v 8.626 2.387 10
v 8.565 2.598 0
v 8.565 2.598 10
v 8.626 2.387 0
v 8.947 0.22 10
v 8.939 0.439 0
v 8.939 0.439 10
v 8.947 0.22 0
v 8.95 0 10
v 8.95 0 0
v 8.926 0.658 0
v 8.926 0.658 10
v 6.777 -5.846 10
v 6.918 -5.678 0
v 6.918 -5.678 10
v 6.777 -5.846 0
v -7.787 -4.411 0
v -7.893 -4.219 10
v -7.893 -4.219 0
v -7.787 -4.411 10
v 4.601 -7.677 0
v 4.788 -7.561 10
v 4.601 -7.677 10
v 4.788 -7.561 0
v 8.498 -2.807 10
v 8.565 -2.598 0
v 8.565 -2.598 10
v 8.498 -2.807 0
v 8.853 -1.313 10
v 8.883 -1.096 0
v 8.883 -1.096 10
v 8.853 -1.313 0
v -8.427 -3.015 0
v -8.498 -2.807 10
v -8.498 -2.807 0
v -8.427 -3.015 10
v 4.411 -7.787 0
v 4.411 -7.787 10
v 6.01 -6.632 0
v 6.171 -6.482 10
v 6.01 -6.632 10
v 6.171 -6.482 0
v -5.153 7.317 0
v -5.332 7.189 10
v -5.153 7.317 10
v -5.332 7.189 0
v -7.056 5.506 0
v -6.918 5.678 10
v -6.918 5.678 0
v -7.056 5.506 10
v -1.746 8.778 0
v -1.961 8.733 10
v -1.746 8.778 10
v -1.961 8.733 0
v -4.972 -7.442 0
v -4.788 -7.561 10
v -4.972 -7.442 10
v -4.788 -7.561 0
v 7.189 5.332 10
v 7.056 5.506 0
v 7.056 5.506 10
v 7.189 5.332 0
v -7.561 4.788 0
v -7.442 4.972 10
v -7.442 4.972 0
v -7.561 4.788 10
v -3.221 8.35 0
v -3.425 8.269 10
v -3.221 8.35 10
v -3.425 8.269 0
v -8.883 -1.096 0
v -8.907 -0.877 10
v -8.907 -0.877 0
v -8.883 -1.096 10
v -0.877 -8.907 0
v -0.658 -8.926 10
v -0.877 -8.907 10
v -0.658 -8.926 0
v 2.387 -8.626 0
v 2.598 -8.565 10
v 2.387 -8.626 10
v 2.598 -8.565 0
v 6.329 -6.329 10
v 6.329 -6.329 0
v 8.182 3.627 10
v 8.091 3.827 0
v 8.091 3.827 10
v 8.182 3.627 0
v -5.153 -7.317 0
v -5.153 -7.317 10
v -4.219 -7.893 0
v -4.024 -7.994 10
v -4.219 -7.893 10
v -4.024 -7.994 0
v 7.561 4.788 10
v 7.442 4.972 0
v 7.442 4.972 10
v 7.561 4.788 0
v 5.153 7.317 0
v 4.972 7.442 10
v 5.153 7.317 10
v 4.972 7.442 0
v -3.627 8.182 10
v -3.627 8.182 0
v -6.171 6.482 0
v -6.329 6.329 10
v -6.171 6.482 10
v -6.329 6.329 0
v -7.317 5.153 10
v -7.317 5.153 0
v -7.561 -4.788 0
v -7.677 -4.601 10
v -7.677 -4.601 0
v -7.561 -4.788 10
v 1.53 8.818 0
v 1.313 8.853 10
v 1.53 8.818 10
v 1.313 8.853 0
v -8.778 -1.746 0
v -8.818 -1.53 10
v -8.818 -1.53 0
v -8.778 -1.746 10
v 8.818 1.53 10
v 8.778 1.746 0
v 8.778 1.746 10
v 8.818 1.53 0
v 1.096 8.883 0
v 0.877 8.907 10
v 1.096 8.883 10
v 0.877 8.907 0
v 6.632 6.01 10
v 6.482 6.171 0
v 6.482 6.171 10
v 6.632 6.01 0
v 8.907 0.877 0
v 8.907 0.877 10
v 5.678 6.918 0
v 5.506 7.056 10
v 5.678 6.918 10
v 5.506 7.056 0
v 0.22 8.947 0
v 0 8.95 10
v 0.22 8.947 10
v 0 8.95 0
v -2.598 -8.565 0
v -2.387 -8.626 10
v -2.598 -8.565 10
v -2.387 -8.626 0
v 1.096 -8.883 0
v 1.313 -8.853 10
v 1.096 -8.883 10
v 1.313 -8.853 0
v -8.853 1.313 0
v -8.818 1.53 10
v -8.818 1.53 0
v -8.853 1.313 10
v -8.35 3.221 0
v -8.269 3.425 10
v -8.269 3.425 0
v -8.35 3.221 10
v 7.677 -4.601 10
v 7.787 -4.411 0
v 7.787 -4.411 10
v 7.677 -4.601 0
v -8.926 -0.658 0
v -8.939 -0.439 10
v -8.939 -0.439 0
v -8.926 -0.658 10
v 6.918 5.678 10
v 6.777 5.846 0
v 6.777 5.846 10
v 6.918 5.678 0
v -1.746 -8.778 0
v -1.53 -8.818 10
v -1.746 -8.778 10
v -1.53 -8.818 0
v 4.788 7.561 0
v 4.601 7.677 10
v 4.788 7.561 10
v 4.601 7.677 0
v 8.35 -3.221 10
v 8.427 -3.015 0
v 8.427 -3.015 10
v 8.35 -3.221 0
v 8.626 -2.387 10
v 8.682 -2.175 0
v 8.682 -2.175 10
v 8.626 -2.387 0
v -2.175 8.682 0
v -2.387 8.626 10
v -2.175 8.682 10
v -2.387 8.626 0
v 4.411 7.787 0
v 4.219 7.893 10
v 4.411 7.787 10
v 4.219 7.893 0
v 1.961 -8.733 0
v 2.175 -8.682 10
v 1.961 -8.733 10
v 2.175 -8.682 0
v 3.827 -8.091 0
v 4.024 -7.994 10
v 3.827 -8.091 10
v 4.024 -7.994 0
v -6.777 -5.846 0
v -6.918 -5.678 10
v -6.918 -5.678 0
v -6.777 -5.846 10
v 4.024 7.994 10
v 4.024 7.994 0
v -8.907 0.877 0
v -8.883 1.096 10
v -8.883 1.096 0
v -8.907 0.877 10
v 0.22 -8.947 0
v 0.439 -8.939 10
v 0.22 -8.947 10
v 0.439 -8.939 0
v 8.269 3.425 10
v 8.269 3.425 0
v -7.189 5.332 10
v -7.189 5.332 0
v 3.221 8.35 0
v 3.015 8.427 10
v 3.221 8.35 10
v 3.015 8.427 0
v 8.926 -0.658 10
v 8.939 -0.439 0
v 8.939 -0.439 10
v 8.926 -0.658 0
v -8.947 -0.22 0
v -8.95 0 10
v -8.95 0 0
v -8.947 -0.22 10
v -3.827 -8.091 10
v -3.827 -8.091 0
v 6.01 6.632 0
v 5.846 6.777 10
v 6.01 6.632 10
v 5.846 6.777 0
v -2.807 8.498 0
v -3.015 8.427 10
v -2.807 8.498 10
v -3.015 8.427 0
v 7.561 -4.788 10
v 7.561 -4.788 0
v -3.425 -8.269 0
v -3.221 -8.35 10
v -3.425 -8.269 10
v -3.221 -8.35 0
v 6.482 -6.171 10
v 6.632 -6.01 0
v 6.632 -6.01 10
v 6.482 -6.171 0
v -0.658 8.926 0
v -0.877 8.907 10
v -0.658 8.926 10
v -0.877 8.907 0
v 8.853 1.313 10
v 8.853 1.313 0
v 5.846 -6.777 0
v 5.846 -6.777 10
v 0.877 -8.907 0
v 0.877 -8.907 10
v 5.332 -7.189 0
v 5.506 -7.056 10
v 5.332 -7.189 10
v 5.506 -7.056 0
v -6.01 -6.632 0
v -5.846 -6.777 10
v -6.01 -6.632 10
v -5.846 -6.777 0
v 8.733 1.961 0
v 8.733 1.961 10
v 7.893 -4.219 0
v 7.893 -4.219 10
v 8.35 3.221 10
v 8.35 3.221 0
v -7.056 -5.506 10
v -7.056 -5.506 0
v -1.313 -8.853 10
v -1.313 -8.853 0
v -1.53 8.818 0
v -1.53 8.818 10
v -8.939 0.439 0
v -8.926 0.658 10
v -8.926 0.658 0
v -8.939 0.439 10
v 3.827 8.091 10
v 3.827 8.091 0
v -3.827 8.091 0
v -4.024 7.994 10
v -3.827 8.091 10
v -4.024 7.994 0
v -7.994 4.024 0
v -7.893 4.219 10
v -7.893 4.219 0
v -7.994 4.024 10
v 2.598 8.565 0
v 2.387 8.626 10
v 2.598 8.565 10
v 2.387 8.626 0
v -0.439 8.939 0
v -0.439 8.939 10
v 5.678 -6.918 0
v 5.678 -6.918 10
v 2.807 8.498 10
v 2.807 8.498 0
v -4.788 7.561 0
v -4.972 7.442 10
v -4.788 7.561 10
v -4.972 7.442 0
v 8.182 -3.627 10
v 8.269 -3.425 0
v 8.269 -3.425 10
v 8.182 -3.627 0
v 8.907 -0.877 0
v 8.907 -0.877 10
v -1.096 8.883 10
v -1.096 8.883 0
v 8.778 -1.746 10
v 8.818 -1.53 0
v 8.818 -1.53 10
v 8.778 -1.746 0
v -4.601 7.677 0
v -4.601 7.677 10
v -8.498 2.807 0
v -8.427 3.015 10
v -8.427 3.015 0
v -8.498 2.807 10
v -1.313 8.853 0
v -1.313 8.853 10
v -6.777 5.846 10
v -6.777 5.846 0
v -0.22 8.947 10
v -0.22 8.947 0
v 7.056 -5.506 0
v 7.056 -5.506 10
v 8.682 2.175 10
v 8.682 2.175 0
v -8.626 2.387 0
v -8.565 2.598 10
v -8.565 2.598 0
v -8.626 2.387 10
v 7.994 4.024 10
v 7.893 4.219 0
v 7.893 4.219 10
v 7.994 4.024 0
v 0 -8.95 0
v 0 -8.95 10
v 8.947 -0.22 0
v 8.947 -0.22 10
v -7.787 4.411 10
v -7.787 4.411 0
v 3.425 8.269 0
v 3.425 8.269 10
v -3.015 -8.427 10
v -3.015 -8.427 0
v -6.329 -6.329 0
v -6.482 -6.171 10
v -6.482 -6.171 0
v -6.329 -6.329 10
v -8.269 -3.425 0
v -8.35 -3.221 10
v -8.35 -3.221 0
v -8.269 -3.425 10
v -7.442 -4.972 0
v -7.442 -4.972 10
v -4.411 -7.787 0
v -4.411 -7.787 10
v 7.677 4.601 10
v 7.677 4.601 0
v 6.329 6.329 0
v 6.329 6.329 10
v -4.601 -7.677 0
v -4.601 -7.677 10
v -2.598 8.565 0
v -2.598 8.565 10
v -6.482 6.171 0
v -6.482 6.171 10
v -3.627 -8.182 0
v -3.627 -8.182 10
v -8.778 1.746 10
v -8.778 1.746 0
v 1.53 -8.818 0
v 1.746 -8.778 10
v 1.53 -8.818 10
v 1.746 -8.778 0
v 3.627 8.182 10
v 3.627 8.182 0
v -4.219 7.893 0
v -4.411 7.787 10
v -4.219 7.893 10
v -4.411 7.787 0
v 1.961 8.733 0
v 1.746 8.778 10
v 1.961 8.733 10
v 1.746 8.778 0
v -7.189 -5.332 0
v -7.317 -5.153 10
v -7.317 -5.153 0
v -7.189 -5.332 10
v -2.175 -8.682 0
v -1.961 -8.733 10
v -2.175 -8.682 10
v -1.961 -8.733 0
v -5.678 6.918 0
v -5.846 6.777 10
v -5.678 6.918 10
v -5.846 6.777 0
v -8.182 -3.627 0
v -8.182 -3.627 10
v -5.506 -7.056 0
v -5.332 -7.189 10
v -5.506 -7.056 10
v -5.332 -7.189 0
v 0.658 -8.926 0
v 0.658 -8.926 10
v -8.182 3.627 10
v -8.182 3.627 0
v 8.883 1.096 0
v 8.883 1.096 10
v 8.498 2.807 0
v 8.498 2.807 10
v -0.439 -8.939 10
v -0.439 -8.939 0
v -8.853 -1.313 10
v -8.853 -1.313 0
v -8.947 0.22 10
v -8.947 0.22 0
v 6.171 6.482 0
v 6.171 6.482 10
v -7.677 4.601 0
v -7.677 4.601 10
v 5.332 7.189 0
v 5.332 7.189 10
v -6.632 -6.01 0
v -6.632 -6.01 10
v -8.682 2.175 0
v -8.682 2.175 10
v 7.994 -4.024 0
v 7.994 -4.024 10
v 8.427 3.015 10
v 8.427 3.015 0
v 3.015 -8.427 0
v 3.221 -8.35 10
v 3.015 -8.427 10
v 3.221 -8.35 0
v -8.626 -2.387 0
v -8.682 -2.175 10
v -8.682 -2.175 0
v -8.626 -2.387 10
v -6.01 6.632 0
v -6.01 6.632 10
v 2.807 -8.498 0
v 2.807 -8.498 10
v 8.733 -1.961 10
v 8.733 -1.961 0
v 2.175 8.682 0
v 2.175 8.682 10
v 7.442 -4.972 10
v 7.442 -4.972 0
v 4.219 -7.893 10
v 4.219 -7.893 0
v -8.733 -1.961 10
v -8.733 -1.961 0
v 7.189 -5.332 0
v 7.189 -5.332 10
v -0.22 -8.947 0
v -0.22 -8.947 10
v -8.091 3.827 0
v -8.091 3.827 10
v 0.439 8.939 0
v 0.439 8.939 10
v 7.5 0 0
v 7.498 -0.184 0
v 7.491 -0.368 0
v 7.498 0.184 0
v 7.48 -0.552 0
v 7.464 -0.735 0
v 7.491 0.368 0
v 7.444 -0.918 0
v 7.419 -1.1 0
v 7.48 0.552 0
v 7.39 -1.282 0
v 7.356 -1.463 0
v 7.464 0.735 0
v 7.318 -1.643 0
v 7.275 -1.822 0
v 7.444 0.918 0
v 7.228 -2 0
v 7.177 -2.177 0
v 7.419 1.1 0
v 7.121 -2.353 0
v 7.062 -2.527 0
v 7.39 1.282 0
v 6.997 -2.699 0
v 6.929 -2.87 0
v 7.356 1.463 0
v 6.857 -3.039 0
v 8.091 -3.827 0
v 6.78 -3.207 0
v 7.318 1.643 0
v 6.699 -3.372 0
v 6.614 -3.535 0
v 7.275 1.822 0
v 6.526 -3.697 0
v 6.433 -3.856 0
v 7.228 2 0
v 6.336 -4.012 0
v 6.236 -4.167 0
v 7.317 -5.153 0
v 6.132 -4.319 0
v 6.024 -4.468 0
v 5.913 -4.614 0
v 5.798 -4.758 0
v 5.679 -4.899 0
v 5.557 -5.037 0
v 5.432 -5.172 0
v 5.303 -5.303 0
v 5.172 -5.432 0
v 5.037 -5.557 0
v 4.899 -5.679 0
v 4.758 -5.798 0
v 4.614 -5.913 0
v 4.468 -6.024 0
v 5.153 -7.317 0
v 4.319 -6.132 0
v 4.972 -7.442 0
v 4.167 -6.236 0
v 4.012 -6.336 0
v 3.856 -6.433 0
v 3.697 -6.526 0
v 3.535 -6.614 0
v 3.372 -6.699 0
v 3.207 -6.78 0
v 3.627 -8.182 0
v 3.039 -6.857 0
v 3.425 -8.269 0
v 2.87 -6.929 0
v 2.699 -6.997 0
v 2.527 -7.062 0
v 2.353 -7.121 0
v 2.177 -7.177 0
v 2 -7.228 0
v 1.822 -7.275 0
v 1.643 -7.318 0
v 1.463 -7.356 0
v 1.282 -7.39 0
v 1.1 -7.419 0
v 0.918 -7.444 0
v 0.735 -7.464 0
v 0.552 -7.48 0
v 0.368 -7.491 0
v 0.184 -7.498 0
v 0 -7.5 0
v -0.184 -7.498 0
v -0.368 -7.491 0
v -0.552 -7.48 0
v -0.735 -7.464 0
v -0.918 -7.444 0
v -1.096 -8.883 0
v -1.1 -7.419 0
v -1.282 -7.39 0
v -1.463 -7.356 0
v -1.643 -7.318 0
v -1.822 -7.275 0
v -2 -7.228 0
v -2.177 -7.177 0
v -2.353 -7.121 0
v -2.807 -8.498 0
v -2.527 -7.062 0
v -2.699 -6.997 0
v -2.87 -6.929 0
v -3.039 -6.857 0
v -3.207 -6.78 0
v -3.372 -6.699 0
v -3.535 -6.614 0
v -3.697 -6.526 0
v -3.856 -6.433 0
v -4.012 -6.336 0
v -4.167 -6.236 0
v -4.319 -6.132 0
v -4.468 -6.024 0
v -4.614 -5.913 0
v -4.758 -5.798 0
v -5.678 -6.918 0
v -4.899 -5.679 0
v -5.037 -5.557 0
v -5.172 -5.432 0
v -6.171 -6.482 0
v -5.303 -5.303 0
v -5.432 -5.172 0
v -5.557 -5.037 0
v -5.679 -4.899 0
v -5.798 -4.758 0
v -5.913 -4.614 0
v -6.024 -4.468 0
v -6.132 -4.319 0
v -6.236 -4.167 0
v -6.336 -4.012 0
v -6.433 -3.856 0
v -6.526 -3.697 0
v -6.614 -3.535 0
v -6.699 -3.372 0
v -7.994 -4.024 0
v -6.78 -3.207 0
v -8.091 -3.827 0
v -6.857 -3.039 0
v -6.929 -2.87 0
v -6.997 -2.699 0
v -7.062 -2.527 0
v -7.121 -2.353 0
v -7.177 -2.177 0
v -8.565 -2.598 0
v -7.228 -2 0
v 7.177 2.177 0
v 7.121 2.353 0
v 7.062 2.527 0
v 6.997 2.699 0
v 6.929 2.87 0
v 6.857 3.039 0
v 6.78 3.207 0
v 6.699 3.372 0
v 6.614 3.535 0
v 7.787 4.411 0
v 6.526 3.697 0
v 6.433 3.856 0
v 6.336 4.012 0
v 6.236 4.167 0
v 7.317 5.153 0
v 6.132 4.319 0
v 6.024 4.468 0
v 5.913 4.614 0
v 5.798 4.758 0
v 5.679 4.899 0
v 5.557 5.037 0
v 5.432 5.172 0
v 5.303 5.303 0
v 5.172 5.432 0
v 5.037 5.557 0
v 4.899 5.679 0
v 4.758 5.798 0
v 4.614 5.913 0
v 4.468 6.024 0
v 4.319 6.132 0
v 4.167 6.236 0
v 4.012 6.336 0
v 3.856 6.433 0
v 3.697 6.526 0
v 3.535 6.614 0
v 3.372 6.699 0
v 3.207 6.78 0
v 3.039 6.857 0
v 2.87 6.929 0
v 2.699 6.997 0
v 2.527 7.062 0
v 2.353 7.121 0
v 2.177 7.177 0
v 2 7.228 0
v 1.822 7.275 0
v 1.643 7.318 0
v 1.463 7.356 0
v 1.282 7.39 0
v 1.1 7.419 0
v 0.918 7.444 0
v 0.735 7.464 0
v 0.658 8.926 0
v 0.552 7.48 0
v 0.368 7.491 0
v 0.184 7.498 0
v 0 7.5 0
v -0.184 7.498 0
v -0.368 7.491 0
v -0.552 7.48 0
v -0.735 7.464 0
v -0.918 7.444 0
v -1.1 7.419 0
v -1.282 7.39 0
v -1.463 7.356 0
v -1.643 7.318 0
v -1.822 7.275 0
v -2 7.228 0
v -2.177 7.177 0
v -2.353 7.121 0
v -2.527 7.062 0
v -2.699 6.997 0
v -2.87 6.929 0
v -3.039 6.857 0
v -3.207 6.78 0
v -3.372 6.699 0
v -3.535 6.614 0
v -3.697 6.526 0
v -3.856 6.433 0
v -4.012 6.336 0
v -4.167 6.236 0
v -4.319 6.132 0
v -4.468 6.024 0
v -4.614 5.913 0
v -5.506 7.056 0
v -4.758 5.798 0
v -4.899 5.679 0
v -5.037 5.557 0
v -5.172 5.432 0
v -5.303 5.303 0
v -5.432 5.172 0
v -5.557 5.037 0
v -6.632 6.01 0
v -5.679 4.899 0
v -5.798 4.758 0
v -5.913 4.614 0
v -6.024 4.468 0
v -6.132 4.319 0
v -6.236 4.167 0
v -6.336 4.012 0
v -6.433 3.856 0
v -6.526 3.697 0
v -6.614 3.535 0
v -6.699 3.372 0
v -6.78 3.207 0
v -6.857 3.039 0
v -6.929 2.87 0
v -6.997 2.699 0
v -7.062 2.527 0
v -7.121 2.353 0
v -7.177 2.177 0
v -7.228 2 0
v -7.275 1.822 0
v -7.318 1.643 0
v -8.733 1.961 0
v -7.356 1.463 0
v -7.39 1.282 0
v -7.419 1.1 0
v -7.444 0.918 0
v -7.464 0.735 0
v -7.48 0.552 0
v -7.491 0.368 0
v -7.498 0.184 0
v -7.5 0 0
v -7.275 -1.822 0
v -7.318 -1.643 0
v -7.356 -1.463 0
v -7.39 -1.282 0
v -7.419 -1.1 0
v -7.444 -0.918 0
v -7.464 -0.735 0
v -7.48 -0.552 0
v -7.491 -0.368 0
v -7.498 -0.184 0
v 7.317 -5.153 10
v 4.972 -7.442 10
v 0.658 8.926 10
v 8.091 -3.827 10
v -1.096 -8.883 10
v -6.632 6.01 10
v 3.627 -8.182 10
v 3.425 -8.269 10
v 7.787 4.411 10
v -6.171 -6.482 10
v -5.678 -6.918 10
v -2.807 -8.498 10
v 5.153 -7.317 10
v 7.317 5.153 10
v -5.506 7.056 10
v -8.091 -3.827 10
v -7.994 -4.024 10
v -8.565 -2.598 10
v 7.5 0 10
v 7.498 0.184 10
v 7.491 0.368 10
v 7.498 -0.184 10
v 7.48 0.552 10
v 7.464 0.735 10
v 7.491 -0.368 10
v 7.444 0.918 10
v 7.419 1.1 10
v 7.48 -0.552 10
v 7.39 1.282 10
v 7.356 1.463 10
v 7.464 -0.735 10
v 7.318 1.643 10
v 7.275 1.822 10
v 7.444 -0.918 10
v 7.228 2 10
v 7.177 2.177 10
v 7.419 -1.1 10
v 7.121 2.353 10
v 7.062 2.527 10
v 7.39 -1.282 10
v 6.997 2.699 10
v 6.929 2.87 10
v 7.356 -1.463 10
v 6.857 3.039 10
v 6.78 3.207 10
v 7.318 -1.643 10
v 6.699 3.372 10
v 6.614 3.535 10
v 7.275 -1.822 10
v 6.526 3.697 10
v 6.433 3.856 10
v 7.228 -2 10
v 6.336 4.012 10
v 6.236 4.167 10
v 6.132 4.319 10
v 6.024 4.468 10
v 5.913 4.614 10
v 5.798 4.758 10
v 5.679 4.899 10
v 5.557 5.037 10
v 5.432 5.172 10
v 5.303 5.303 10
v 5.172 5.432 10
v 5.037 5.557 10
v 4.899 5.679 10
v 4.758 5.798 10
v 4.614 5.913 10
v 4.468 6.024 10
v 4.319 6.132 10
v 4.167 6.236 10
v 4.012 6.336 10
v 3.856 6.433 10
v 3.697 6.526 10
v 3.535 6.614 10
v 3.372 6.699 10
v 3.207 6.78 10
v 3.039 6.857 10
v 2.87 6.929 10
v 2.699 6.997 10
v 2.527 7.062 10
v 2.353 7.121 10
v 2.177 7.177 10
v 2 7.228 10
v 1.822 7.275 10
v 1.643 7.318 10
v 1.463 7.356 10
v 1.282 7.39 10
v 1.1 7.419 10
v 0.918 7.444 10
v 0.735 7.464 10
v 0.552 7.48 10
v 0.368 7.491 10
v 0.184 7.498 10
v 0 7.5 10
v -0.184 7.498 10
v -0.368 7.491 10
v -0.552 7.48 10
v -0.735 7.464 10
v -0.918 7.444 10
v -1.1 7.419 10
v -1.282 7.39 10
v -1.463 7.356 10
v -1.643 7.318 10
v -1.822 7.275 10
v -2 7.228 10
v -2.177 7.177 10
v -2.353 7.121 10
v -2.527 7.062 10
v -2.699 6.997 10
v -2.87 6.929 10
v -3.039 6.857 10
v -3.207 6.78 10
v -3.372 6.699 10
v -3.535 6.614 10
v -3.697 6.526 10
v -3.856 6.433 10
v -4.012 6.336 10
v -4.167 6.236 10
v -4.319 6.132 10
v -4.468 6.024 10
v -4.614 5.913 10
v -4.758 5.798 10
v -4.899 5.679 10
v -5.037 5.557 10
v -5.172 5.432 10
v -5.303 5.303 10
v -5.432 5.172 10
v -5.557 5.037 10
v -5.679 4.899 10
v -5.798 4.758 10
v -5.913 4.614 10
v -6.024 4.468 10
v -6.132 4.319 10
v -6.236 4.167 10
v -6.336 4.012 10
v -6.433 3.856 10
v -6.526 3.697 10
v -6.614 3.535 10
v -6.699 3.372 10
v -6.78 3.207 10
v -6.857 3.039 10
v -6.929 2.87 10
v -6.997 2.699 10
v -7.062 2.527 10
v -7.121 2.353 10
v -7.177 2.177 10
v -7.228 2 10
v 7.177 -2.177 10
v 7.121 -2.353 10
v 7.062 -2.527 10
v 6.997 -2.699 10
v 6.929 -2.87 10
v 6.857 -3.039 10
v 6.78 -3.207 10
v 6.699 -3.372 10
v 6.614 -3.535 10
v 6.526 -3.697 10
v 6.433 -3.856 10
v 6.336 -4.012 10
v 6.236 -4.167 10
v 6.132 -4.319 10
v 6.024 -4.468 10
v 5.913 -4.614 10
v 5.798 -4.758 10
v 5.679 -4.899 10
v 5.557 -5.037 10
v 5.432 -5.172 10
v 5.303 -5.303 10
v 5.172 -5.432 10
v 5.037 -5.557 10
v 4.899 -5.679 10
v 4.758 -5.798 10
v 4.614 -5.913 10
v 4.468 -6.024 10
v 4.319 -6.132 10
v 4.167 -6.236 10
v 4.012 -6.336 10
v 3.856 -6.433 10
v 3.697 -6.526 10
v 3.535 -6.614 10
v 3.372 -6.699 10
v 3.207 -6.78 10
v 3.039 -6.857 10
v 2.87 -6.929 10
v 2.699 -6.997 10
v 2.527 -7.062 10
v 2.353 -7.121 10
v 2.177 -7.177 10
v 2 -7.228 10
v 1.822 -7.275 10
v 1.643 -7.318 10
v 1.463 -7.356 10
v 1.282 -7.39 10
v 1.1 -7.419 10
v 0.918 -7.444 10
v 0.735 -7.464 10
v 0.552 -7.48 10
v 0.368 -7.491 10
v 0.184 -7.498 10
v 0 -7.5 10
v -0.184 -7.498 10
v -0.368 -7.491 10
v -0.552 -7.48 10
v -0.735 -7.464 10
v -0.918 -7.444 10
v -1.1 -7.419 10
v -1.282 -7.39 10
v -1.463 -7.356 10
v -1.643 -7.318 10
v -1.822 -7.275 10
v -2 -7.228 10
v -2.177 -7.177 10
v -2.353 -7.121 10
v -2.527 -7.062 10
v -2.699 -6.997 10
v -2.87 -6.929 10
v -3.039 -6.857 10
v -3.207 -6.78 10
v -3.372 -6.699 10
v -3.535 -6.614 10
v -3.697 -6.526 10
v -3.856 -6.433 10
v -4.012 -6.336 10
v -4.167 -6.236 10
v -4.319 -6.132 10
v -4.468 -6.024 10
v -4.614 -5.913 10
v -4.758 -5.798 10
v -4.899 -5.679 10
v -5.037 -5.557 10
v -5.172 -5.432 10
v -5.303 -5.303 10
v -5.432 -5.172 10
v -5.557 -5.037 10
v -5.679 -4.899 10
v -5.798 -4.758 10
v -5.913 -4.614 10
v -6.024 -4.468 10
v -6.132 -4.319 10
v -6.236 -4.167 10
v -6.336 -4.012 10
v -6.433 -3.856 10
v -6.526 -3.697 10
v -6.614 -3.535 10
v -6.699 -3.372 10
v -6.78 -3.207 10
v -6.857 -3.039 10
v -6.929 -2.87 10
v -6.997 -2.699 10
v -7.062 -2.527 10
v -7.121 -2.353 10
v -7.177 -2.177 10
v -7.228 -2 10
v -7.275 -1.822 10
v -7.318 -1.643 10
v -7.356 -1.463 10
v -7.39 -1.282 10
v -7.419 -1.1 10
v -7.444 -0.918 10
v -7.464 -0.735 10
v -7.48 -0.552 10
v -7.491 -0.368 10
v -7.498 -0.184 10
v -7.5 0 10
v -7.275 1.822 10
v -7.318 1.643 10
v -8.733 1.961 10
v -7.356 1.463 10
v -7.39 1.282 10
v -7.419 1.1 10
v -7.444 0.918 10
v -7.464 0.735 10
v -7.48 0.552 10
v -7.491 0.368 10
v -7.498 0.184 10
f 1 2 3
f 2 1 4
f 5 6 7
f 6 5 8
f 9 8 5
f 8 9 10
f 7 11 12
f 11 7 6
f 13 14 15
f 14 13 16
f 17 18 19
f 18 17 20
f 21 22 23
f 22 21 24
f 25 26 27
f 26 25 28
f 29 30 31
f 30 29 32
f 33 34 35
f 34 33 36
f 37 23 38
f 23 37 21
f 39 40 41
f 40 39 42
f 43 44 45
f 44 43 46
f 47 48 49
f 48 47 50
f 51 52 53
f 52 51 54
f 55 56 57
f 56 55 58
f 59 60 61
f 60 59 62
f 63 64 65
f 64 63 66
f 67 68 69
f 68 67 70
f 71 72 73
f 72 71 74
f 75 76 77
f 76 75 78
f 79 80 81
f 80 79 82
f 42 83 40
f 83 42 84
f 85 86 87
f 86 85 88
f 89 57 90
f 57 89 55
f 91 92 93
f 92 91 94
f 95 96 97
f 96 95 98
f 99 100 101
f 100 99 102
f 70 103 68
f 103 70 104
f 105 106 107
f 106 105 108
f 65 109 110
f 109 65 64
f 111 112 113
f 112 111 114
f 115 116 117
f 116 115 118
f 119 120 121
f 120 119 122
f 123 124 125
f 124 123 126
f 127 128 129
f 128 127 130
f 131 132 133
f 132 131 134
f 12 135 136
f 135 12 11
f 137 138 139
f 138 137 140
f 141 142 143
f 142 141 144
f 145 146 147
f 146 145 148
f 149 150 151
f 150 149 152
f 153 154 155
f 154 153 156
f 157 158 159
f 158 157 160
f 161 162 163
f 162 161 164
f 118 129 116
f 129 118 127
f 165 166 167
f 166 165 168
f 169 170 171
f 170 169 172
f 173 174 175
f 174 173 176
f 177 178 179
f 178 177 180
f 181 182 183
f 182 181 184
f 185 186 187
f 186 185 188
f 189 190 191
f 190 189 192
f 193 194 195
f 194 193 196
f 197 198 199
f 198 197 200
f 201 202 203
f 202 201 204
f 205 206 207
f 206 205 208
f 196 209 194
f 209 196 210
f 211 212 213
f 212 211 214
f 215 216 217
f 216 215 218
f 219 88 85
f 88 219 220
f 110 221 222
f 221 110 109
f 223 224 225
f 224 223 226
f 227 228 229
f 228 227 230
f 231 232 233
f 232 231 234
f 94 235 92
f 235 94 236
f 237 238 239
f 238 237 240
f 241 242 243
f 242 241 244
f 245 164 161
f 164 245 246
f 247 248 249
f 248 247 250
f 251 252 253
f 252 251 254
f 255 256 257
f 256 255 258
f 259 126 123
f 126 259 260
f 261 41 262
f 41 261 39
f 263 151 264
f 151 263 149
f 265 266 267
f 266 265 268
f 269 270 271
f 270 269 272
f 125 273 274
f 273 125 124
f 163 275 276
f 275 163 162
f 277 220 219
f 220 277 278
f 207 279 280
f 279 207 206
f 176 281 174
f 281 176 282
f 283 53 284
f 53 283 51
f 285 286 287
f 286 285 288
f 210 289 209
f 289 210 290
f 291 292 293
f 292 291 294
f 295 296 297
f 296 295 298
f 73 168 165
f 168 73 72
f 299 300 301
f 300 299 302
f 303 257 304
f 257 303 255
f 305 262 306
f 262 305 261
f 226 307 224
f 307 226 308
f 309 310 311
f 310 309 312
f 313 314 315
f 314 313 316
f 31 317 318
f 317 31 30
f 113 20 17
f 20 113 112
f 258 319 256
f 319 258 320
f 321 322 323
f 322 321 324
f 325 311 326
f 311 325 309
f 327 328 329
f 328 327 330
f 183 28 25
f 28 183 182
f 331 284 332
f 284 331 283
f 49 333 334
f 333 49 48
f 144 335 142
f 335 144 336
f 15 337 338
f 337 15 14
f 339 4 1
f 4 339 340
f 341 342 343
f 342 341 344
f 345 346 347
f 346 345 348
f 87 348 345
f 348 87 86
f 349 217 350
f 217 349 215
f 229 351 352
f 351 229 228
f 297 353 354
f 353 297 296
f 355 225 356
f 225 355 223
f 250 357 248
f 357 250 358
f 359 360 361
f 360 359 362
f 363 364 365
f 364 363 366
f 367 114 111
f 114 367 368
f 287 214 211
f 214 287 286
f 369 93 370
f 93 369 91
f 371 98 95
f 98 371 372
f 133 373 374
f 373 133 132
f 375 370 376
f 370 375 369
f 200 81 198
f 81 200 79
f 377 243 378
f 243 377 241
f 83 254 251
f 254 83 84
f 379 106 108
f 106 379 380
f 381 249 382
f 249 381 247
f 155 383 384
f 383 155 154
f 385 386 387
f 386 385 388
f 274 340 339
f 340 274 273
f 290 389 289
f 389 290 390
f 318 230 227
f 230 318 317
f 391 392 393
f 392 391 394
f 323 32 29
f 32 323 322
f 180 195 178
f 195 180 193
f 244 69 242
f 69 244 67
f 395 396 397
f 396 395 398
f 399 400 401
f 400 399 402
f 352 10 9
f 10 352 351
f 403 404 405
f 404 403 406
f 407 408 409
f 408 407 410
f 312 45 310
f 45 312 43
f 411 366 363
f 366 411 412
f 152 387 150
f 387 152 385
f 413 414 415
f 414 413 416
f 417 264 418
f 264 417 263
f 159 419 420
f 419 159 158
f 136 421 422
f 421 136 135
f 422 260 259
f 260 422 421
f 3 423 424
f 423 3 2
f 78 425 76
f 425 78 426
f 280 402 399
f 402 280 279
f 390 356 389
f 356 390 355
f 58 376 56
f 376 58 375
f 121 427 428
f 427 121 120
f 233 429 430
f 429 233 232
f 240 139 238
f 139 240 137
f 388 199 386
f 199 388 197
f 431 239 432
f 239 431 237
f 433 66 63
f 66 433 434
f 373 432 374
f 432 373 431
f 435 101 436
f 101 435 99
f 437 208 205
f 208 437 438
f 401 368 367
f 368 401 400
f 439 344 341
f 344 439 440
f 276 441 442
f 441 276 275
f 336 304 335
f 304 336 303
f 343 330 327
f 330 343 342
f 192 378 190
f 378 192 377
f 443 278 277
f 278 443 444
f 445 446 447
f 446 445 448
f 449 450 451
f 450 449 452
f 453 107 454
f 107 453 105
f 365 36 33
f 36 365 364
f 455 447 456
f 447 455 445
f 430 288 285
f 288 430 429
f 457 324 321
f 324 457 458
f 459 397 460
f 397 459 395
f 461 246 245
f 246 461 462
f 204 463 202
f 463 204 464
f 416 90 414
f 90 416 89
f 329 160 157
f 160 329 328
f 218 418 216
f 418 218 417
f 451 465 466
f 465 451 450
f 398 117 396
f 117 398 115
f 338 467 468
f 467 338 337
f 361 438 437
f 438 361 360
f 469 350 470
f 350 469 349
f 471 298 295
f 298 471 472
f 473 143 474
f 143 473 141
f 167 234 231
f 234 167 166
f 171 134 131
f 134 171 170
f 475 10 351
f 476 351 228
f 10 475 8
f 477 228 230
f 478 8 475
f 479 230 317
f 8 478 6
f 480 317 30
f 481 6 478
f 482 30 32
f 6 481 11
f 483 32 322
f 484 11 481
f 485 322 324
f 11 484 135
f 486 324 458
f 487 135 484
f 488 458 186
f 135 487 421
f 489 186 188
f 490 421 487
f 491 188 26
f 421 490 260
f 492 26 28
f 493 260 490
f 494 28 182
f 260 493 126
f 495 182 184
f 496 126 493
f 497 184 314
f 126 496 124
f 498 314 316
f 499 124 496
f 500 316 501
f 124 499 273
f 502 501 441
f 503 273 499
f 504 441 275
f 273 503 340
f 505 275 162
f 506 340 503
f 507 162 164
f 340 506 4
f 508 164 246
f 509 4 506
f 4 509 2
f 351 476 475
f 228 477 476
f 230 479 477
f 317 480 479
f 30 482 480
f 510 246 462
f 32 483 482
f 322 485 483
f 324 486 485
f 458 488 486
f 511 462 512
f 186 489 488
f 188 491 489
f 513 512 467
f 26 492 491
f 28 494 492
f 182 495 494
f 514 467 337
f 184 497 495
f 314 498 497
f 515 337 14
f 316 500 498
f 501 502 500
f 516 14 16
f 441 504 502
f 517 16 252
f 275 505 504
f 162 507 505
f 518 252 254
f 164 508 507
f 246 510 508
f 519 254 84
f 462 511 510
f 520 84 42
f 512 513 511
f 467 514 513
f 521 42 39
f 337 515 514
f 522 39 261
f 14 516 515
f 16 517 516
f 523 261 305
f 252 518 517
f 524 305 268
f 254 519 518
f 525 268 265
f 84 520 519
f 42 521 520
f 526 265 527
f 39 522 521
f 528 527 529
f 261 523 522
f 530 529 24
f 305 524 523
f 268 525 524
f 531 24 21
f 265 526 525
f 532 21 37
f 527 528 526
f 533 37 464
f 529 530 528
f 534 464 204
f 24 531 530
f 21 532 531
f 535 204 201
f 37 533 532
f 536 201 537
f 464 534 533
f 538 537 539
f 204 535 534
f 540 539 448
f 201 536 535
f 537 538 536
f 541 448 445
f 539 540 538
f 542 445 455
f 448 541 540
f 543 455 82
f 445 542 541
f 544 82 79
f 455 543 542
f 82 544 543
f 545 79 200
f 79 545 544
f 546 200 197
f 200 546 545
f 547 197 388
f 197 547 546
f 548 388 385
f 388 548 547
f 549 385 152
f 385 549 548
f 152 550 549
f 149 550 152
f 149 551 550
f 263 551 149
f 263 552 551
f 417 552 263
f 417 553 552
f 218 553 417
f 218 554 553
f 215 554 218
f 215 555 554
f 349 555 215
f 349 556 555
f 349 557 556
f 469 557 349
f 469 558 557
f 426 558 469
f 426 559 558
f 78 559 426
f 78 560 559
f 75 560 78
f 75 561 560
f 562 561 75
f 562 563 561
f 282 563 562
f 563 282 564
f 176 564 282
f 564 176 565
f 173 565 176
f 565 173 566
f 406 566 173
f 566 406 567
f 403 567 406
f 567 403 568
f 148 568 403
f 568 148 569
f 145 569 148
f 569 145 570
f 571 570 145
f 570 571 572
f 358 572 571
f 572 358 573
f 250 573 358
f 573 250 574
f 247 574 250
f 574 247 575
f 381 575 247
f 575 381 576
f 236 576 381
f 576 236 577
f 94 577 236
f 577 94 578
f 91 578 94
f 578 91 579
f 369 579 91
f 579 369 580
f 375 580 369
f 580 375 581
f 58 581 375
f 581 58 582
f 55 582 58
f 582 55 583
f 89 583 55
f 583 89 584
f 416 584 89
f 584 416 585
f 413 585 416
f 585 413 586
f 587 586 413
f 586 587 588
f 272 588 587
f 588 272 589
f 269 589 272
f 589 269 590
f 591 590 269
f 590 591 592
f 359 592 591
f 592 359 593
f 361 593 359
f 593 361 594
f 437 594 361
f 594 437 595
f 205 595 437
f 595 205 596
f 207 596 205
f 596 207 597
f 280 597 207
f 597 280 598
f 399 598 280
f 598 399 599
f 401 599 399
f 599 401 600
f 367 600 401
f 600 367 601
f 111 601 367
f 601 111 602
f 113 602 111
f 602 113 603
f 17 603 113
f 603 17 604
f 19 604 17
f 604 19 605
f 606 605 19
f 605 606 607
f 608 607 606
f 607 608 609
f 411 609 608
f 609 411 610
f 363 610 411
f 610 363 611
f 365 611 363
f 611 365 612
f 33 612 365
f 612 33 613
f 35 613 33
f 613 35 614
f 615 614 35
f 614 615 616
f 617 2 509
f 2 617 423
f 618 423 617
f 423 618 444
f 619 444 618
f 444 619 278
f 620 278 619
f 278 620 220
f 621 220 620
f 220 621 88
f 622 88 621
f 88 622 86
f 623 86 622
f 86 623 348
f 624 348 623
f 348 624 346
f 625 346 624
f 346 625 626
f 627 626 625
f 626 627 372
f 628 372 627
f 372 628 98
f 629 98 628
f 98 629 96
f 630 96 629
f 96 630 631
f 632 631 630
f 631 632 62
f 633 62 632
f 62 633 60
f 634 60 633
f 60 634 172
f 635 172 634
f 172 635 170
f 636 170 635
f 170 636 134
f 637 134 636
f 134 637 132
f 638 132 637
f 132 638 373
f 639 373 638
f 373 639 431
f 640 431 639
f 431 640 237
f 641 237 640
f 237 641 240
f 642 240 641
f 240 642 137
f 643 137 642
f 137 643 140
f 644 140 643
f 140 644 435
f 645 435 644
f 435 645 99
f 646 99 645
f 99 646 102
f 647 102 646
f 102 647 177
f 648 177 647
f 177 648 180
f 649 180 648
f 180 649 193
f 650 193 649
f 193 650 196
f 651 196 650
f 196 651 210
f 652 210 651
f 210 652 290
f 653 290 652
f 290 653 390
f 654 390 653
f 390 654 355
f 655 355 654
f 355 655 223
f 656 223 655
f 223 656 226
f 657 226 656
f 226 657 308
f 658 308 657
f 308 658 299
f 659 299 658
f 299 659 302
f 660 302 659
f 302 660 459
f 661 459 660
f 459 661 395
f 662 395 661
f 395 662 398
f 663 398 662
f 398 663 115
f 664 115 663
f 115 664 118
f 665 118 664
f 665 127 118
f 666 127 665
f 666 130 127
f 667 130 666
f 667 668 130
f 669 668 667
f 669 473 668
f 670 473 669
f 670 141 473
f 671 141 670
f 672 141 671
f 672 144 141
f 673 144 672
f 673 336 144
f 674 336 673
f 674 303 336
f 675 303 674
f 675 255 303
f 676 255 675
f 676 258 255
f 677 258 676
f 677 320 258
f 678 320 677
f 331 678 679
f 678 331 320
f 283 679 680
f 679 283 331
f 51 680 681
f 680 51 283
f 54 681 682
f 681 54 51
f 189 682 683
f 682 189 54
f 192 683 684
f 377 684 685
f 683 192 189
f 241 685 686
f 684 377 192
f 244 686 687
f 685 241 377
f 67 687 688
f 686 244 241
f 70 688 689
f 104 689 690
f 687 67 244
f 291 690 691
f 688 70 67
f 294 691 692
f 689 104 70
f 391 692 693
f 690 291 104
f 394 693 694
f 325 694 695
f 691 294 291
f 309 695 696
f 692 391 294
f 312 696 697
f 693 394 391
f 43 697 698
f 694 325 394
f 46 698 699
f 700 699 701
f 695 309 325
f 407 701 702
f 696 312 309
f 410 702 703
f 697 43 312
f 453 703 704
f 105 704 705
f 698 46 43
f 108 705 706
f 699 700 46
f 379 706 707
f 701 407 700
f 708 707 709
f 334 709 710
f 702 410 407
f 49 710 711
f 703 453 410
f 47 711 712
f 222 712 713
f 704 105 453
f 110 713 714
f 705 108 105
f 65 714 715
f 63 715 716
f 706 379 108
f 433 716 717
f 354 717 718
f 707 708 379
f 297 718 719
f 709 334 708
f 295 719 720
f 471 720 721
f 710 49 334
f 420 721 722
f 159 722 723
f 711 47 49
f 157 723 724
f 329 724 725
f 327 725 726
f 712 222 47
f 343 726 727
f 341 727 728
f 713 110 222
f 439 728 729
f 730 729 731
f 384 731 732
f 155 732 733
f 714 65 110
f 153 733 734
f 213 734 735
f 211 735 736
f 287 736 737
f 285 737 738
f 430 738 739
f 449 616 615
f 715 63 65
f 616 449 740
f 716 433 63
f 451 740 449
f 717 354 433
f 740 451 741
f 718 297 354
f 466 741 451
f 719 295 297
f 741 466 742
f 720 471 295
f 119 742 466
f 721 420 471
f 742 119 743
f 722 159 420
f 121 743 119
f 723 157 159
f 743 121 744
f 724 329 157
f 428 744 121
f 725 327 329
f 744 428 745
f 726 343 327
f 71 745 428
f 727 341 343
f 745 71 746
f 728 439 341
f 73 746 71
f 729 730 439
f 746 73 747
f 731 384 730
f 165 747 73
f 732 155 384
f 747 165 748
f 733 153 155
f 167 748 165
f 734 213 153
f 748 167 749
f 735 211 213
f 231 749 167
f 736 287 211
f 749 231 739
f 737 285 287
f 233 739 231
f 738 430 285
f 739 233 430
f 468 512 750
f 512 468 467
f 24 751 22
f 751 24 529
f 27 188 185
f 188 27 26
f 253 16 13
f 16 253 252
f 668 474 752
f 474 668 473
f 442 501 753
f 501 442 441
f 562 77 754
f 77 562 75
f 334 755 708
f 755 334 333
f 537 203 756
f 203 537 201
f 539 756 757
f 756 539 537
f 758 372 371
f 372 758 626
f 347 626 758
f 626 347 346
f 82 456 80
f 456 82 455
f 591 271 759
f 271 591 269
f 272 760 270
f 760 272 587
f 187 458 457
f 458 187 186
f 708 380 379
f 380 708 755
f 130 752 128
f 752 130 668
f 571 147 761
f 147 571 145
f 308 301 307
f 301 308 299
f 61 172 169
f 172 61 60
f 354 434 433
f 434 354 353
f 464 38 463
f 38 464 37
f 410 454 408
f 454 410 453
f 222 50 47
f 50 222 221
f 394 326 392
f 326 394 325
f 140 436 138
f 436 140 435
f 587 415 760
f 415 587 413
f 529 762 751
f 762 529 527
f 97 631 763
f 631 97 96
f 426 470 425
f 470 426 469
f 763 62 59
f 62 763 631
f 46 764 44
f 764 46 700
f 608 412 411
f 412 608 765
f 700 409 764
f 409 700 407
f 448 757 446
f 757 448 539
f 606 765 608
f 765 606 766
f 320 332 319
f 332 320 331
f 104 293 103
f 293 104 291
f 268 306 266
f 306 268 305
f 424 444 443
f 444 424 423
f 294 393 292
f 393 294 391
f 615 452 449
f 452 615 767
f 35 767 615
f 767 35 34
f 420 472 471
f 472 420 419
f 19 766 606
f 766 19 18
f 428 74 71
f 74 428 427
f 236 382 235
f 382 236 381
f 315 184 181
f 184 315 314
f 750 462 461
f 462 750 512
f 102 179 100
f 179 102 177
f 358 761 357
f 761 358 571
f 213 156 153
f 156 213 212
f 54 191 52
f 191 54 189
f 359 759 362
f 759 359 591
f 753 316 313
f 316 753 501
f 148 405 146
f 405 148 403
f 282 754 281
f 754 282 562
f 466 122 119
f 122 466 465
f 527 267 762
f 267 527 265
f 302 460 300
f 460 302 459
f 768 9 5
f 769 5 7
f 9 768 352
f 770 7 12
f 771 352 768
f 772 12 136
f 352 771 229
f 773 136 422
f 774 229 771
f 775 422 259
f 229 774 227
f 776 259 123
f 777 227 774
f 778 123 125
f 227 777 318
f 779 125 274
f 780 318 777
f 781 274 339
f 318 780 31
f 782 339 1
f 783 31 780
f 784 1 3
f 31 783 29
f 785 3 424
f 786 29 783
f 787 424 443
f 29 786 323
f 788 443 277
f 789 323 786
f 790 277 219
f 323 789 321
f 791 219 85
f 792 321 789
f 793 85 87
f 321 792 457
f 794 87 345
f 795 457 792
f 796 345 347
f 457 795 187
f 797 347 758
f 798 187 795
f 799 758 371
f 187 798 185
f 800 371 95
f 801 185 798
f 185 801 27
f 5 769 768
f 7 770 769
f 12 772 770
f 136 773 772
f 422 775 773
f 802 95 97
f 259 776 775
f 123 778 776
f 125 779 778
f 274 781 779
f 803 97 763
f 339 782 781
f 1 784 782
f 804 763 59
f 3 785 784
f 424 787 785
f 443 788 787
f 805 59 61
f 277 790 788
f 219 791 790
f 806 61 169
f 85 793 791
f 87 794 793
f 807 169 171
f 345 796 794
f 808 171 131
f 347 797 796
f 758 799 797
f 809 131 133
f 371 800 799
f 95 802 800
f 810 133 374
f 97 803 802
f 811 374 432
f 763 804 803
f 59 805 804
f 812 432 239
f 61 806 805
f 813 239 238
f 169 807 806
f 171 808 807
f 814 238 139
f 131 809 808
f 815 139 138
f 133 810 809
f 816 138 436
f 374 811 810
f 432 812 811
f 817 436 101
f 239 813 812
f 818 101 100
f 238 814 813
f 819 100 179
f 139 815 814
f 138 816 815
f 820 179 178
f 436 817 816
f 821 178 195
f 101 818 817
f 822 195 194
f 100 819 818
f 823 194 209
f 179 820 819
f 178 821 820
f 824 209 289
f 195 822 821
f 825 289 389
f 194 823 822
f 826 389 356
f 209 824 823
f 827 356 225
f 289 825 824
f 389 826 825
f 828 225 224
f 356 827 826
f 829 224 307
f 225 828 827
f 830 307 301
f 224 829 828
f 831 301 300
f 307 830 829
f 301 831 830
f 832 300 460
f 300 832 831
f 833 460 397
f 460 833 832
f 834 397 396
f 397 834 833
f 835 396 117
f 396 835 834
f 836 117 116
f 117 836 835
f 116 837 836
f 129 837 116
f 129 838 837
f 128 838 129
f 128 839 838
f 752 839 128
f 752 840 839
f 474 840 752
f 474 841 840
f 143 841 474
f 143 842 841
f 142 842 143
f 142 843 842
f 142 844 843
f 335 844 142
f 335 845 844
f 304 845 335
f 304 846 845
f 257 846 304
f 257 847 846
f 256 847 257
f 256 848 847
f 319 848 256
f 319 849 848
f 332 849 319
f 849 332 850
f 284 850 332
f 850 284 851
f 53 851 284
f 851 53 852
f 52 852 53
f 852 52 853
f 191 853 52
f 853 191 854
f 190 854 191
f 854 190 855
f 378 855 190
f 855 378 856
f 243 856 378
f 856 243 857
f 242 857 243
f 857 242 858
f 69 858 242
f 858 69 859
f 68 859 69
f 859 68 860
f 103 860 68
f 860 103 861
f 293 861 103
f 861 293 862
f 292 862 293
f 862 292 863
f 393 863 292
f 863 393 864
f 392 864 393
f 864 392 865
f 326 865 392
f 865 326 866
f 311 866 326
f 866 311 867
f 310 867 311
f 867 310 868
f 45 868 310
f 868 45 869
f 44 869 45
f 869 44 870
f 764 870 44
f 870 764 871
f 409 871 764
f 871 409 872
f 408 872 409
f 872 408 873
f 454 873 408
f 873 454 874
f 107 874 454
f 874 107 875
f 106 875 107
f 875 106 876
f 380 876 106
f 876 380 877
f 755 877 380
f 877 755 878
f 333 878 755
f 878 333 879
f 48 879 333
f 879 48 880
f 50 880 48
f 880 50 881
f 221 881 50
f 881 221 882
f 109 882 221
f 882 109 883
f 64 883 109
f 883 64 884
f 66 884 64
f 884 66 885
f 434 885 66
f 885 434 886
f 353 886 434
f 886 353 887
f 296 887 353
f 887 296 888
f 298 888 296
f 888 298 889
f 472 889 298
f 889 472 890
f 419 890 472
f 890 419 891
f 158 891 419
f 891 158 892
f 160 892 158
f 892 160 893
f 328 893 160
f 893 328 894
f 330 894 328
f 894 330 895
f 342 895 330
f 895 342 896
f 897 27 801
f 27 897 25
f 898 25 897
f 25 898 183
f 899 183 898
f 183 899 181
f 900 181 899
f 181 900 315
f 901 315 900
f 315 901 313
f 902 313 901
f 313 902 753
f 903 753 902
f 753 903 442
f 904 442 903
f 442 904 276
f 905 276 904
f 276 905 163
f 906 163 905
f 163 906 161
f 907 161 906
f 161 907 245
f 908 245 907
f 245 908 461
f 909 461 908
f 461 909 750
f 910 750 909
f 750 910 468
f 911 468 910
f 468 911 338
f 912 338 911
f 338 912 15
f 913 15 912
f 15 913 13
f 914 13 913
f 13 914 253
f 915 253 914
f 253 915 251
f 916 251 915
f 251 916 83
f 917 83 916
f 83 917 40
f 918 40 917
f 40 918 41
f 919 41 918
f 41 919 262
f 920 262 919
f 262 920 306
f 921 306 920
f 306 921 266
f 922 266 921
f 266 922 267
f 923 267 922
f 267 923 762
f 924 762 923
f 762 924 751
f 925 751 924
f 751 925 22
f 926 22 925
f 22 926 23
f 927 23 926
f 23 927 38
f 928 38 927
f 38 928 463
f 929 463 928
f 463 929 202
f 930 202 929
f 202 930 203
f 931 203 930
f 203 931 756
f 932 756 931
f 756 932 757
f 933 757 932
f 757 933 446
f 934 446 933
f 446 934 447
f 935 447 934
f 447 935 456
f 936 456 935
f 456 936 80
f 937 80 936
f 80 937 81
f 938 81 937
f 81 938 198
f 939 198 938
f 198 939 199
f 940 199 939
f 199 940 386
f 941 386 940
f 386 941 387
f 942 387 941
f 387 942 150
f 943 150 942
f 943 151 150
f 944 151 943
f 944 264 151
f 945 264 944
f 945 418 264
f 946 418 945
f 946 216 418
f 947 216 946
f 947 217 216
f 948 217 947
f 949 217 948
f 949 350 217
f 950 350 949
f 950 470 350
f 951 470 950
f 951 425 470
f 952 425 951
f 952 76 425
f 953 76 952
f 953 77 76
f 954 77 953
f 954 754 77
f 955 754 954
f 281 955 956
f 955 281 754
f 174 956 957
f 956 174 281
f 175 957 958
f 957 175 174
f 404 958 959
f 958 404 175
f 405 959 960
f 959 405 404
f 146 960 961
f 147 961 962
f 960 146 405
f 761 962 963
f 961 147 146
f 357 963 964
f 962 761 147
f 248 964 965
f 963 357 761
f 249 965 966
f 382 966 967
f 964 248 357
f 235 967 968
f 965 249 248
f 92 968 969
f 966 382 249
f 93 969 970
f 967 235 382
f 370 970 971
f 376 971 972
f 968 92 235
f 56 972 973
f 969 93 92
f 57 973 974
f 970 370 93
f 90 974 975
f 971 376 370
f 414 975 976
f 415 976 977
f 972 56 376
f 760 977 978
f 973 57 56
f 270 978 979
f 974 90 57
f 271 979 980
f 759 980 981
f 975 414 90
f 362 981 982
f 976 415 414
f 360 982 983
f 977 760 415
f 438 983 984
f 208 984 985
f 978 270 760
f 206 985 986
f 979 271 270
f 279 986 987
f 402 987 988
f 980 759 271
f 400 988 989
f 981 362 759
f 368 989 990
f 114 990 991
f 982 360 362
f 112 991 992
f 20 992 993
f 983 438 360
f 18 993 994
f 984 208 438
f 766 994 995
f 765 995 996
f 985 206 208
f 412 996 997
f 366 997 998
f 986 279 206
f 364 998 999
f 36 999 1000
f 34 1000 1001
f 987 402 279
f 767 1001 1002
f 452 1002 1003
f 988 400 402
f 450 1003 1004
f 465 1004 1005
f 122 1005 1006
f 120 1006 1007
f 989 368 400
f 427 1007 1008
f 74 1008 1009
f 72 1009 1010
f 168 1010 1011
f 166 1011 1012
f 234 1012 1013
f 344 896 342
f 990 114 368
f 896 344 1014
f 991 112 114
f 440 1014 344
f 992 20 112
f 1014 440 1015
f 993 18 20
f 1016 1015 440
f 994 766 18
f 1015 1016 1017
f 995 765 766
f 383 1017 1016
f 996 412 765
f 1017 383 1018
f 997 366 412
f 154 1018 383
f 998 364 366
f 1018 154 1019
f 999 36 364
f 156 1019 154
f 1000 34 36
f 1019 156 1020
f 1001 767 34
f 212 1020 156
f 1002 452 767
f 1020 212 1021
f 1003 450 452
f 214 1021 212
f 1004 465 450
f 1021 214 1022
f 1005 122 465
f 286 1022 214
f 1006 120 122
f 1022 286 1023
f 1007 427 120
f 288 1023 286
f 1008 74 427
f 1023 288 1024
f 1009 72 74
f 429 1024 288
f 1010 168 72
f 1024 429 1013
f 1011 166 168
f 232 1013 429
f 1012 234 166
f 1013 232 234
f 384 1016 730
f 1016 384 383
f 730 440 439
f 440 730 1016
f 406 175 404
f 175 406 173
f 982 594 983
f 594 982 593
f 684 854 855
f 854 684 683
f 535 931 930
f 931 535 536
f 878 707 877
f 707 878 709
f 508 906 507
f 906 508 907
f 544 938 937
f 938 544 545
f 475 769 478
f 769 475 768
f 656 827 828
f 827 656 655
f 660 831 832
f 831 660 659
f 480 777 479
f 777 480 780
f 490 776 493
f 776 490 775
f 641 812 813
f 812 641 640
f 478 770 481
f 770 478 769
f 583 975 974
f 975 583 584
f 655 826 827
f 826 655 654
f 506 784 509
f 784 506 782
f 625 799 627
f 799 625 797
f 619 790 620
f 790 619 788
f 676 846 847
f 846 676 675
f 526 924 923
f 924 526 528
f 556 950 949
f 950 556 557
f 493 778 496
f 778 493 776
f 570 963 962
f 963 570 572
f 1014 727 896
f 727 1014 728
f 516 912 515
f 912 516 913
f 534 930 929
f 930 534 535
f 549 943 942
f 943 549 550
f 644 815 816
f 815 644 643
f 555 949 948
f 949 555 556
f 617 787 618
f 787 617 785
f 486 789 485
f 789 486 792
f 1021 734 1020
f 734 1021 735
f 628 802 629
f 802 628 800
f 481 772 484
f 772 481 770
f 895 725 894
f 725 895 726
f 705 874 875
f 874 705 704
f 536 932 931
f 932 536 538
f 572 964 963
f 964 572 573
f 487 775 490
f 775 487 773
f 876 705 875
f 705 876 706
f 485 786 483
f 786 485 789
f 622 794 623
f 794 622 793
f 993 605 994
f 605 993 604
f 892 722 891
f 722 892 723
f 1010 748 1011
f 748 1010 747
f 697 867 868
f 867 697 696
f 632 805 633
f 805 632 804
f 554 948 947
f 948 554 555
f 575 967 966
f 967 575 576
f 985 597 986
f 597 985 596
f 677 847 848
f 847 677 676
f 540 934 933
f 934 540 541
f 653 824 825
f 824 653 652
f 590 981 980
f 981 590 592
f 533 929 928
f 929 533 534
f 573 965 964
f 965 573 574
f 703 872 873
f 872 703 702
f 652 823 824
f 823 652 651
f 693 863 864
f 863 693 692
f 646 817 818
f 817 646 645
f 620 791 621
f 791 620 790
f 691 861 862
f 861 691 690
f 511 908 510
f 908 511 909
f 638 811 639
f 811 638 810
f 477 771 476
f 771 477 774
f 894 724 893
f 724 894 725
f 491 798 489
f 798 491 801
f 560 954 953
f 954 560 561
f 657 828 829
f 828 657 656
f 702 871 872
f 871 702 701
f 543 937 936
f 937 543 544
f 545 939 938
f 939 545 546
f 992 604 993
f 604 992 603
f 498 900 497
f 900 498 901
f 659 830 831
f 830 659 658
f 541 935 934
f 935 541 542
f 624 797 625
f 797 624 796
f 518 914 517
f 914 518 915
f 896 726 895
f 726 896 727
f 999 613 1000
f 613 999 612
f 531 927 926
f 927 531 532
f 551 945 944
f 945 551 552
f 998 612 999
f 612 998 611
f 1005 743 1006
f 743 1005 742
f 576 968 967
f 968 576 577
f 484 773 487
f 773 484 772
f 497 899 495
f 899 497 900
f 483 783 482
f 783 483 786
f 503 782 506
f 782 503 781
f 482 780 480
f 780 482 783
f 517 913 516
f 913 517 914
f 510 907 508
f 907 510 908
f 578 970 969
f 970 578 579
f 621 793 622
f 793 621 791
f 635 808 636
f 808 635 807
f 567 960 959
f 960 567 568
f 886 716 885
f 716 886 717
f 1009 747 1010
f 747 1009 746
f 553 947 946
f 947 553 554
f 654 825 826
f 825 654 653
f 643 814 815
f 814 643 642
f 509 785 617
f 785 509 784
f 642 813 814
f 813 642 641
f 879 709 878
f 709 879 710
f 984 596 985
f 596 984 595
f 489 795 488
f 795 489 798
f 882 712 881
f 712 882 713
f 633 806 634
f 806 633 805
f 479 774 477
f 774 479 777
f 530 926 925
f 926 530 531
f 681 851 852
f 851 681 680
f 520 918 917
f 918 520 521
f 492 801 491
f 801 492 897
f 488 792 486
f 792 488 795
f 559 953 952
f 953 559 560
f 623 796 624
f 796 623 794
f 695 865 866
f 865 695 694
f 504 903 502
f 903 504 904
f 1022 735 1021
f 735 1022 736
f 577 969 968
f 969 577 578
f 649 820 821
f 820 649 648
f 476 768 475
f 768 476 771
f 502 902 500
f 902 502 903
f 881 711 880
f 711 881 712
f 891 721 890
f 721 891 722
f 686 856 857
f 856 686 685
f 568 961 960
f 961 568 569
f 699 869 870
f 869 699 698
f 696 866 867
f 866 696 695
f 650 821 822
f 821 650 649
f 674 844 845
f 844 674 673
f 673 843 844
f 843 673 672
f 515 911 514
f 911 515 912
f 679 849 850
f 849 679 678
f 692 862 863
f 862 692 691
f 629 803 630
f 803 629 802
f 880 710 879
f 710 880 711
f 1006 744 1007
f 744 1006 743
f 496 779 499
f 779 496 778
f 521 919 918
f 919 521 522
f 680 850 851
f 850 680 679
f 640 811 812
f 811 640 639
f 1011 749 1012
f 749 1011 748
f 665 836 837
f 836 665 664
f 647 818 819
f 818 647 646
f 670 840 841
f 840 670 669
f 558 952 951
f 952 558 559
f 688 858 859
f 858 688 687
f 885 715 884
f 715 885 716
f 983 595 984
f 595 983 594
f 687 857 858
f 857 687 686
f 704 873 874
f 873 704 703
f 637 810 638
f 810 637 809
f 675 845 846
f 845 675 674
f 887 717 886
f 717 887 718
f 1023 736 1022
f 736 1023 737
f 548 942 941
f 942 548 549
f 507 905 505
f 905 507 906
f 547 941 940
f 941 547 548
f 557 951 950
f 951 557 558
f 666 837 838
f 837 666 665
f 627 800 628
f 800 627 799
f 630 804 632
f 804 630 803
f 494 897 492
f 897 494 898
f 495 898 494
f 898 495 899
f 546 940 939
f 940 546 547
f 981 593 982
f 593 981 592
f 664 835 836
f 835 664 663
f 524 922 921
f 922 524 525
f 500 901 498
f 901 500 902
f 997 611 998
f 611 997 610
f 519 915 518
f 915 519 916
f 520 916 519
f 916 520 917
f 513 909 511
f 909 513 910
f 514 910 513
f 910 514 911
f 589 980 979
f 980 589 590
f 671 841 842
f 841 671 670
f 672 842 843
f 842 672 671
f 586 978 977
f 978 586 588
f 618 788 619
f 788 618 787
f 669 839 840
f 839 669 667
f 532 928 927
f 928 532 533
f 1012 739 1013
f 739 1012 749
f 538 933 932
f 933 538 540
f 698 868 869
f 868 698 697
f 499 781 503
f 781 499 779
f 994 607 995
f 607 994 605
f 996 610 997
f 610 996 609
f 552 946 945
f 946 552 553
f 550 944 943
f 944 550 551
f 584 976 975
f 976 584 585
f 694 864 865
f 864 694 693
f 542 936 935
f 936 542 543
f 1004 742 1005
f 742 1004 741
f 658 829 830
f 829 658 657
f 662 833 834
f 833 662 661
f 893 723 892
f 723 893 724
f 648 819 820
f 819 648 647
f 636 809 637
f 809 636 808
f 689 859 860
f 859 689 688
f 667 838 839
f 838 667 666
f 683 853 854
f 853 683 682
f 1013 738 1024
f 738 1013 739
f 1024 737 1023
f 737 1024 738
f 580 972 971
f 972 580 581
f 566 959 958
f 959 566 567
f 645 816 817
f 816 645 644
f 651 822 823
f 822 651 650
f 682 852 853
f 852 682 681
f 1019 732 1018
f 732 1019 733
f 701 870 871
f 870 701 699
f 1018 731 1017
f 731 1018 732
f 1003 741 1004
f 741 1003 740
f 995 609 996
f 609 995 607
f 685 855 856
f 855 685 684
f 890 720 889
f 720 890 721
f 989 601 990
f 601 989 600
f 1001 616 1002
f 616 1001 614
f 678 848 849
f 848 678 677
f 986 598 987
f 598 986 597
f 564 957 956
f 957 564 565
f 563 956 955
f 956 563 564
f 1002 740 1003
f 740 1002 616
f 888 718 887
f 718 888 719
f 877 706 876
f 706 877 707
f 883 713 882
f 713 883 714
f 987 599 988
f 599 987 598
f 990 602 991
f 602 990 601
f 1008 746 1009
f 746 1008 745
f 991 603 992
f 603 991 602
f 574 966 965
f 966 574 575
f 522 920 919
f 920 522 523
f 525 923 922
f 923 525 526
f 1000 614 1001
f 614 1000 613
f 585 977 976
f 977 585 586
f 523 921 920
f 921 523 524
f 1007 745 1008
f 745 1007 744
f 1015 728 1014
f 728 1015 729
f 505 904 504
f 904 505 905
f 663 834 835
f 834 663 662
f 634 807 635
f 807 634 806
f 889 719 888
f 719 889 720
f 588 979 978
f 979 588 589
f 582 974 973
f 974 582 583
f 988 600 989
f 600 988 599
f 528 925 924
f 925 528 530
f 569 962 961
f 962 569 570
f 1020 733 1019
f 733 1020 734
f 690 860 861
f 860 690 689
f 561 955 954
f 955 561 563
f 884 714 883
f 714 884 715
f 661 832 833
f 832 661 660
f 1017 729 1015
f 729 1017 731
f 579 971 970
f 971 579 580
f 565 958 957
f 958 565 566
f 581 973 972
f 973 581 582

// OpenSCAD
$fn=256;
h=10;
id=15;
eps = 0.01;

module ring(w) {
difference() {
  od=id+2*w;
  cylinder(h=h, d=od);
  translate([0, 0, -eps]) cylinder(h=h+2*eps, d=id);
}
}

ring(1.45);
